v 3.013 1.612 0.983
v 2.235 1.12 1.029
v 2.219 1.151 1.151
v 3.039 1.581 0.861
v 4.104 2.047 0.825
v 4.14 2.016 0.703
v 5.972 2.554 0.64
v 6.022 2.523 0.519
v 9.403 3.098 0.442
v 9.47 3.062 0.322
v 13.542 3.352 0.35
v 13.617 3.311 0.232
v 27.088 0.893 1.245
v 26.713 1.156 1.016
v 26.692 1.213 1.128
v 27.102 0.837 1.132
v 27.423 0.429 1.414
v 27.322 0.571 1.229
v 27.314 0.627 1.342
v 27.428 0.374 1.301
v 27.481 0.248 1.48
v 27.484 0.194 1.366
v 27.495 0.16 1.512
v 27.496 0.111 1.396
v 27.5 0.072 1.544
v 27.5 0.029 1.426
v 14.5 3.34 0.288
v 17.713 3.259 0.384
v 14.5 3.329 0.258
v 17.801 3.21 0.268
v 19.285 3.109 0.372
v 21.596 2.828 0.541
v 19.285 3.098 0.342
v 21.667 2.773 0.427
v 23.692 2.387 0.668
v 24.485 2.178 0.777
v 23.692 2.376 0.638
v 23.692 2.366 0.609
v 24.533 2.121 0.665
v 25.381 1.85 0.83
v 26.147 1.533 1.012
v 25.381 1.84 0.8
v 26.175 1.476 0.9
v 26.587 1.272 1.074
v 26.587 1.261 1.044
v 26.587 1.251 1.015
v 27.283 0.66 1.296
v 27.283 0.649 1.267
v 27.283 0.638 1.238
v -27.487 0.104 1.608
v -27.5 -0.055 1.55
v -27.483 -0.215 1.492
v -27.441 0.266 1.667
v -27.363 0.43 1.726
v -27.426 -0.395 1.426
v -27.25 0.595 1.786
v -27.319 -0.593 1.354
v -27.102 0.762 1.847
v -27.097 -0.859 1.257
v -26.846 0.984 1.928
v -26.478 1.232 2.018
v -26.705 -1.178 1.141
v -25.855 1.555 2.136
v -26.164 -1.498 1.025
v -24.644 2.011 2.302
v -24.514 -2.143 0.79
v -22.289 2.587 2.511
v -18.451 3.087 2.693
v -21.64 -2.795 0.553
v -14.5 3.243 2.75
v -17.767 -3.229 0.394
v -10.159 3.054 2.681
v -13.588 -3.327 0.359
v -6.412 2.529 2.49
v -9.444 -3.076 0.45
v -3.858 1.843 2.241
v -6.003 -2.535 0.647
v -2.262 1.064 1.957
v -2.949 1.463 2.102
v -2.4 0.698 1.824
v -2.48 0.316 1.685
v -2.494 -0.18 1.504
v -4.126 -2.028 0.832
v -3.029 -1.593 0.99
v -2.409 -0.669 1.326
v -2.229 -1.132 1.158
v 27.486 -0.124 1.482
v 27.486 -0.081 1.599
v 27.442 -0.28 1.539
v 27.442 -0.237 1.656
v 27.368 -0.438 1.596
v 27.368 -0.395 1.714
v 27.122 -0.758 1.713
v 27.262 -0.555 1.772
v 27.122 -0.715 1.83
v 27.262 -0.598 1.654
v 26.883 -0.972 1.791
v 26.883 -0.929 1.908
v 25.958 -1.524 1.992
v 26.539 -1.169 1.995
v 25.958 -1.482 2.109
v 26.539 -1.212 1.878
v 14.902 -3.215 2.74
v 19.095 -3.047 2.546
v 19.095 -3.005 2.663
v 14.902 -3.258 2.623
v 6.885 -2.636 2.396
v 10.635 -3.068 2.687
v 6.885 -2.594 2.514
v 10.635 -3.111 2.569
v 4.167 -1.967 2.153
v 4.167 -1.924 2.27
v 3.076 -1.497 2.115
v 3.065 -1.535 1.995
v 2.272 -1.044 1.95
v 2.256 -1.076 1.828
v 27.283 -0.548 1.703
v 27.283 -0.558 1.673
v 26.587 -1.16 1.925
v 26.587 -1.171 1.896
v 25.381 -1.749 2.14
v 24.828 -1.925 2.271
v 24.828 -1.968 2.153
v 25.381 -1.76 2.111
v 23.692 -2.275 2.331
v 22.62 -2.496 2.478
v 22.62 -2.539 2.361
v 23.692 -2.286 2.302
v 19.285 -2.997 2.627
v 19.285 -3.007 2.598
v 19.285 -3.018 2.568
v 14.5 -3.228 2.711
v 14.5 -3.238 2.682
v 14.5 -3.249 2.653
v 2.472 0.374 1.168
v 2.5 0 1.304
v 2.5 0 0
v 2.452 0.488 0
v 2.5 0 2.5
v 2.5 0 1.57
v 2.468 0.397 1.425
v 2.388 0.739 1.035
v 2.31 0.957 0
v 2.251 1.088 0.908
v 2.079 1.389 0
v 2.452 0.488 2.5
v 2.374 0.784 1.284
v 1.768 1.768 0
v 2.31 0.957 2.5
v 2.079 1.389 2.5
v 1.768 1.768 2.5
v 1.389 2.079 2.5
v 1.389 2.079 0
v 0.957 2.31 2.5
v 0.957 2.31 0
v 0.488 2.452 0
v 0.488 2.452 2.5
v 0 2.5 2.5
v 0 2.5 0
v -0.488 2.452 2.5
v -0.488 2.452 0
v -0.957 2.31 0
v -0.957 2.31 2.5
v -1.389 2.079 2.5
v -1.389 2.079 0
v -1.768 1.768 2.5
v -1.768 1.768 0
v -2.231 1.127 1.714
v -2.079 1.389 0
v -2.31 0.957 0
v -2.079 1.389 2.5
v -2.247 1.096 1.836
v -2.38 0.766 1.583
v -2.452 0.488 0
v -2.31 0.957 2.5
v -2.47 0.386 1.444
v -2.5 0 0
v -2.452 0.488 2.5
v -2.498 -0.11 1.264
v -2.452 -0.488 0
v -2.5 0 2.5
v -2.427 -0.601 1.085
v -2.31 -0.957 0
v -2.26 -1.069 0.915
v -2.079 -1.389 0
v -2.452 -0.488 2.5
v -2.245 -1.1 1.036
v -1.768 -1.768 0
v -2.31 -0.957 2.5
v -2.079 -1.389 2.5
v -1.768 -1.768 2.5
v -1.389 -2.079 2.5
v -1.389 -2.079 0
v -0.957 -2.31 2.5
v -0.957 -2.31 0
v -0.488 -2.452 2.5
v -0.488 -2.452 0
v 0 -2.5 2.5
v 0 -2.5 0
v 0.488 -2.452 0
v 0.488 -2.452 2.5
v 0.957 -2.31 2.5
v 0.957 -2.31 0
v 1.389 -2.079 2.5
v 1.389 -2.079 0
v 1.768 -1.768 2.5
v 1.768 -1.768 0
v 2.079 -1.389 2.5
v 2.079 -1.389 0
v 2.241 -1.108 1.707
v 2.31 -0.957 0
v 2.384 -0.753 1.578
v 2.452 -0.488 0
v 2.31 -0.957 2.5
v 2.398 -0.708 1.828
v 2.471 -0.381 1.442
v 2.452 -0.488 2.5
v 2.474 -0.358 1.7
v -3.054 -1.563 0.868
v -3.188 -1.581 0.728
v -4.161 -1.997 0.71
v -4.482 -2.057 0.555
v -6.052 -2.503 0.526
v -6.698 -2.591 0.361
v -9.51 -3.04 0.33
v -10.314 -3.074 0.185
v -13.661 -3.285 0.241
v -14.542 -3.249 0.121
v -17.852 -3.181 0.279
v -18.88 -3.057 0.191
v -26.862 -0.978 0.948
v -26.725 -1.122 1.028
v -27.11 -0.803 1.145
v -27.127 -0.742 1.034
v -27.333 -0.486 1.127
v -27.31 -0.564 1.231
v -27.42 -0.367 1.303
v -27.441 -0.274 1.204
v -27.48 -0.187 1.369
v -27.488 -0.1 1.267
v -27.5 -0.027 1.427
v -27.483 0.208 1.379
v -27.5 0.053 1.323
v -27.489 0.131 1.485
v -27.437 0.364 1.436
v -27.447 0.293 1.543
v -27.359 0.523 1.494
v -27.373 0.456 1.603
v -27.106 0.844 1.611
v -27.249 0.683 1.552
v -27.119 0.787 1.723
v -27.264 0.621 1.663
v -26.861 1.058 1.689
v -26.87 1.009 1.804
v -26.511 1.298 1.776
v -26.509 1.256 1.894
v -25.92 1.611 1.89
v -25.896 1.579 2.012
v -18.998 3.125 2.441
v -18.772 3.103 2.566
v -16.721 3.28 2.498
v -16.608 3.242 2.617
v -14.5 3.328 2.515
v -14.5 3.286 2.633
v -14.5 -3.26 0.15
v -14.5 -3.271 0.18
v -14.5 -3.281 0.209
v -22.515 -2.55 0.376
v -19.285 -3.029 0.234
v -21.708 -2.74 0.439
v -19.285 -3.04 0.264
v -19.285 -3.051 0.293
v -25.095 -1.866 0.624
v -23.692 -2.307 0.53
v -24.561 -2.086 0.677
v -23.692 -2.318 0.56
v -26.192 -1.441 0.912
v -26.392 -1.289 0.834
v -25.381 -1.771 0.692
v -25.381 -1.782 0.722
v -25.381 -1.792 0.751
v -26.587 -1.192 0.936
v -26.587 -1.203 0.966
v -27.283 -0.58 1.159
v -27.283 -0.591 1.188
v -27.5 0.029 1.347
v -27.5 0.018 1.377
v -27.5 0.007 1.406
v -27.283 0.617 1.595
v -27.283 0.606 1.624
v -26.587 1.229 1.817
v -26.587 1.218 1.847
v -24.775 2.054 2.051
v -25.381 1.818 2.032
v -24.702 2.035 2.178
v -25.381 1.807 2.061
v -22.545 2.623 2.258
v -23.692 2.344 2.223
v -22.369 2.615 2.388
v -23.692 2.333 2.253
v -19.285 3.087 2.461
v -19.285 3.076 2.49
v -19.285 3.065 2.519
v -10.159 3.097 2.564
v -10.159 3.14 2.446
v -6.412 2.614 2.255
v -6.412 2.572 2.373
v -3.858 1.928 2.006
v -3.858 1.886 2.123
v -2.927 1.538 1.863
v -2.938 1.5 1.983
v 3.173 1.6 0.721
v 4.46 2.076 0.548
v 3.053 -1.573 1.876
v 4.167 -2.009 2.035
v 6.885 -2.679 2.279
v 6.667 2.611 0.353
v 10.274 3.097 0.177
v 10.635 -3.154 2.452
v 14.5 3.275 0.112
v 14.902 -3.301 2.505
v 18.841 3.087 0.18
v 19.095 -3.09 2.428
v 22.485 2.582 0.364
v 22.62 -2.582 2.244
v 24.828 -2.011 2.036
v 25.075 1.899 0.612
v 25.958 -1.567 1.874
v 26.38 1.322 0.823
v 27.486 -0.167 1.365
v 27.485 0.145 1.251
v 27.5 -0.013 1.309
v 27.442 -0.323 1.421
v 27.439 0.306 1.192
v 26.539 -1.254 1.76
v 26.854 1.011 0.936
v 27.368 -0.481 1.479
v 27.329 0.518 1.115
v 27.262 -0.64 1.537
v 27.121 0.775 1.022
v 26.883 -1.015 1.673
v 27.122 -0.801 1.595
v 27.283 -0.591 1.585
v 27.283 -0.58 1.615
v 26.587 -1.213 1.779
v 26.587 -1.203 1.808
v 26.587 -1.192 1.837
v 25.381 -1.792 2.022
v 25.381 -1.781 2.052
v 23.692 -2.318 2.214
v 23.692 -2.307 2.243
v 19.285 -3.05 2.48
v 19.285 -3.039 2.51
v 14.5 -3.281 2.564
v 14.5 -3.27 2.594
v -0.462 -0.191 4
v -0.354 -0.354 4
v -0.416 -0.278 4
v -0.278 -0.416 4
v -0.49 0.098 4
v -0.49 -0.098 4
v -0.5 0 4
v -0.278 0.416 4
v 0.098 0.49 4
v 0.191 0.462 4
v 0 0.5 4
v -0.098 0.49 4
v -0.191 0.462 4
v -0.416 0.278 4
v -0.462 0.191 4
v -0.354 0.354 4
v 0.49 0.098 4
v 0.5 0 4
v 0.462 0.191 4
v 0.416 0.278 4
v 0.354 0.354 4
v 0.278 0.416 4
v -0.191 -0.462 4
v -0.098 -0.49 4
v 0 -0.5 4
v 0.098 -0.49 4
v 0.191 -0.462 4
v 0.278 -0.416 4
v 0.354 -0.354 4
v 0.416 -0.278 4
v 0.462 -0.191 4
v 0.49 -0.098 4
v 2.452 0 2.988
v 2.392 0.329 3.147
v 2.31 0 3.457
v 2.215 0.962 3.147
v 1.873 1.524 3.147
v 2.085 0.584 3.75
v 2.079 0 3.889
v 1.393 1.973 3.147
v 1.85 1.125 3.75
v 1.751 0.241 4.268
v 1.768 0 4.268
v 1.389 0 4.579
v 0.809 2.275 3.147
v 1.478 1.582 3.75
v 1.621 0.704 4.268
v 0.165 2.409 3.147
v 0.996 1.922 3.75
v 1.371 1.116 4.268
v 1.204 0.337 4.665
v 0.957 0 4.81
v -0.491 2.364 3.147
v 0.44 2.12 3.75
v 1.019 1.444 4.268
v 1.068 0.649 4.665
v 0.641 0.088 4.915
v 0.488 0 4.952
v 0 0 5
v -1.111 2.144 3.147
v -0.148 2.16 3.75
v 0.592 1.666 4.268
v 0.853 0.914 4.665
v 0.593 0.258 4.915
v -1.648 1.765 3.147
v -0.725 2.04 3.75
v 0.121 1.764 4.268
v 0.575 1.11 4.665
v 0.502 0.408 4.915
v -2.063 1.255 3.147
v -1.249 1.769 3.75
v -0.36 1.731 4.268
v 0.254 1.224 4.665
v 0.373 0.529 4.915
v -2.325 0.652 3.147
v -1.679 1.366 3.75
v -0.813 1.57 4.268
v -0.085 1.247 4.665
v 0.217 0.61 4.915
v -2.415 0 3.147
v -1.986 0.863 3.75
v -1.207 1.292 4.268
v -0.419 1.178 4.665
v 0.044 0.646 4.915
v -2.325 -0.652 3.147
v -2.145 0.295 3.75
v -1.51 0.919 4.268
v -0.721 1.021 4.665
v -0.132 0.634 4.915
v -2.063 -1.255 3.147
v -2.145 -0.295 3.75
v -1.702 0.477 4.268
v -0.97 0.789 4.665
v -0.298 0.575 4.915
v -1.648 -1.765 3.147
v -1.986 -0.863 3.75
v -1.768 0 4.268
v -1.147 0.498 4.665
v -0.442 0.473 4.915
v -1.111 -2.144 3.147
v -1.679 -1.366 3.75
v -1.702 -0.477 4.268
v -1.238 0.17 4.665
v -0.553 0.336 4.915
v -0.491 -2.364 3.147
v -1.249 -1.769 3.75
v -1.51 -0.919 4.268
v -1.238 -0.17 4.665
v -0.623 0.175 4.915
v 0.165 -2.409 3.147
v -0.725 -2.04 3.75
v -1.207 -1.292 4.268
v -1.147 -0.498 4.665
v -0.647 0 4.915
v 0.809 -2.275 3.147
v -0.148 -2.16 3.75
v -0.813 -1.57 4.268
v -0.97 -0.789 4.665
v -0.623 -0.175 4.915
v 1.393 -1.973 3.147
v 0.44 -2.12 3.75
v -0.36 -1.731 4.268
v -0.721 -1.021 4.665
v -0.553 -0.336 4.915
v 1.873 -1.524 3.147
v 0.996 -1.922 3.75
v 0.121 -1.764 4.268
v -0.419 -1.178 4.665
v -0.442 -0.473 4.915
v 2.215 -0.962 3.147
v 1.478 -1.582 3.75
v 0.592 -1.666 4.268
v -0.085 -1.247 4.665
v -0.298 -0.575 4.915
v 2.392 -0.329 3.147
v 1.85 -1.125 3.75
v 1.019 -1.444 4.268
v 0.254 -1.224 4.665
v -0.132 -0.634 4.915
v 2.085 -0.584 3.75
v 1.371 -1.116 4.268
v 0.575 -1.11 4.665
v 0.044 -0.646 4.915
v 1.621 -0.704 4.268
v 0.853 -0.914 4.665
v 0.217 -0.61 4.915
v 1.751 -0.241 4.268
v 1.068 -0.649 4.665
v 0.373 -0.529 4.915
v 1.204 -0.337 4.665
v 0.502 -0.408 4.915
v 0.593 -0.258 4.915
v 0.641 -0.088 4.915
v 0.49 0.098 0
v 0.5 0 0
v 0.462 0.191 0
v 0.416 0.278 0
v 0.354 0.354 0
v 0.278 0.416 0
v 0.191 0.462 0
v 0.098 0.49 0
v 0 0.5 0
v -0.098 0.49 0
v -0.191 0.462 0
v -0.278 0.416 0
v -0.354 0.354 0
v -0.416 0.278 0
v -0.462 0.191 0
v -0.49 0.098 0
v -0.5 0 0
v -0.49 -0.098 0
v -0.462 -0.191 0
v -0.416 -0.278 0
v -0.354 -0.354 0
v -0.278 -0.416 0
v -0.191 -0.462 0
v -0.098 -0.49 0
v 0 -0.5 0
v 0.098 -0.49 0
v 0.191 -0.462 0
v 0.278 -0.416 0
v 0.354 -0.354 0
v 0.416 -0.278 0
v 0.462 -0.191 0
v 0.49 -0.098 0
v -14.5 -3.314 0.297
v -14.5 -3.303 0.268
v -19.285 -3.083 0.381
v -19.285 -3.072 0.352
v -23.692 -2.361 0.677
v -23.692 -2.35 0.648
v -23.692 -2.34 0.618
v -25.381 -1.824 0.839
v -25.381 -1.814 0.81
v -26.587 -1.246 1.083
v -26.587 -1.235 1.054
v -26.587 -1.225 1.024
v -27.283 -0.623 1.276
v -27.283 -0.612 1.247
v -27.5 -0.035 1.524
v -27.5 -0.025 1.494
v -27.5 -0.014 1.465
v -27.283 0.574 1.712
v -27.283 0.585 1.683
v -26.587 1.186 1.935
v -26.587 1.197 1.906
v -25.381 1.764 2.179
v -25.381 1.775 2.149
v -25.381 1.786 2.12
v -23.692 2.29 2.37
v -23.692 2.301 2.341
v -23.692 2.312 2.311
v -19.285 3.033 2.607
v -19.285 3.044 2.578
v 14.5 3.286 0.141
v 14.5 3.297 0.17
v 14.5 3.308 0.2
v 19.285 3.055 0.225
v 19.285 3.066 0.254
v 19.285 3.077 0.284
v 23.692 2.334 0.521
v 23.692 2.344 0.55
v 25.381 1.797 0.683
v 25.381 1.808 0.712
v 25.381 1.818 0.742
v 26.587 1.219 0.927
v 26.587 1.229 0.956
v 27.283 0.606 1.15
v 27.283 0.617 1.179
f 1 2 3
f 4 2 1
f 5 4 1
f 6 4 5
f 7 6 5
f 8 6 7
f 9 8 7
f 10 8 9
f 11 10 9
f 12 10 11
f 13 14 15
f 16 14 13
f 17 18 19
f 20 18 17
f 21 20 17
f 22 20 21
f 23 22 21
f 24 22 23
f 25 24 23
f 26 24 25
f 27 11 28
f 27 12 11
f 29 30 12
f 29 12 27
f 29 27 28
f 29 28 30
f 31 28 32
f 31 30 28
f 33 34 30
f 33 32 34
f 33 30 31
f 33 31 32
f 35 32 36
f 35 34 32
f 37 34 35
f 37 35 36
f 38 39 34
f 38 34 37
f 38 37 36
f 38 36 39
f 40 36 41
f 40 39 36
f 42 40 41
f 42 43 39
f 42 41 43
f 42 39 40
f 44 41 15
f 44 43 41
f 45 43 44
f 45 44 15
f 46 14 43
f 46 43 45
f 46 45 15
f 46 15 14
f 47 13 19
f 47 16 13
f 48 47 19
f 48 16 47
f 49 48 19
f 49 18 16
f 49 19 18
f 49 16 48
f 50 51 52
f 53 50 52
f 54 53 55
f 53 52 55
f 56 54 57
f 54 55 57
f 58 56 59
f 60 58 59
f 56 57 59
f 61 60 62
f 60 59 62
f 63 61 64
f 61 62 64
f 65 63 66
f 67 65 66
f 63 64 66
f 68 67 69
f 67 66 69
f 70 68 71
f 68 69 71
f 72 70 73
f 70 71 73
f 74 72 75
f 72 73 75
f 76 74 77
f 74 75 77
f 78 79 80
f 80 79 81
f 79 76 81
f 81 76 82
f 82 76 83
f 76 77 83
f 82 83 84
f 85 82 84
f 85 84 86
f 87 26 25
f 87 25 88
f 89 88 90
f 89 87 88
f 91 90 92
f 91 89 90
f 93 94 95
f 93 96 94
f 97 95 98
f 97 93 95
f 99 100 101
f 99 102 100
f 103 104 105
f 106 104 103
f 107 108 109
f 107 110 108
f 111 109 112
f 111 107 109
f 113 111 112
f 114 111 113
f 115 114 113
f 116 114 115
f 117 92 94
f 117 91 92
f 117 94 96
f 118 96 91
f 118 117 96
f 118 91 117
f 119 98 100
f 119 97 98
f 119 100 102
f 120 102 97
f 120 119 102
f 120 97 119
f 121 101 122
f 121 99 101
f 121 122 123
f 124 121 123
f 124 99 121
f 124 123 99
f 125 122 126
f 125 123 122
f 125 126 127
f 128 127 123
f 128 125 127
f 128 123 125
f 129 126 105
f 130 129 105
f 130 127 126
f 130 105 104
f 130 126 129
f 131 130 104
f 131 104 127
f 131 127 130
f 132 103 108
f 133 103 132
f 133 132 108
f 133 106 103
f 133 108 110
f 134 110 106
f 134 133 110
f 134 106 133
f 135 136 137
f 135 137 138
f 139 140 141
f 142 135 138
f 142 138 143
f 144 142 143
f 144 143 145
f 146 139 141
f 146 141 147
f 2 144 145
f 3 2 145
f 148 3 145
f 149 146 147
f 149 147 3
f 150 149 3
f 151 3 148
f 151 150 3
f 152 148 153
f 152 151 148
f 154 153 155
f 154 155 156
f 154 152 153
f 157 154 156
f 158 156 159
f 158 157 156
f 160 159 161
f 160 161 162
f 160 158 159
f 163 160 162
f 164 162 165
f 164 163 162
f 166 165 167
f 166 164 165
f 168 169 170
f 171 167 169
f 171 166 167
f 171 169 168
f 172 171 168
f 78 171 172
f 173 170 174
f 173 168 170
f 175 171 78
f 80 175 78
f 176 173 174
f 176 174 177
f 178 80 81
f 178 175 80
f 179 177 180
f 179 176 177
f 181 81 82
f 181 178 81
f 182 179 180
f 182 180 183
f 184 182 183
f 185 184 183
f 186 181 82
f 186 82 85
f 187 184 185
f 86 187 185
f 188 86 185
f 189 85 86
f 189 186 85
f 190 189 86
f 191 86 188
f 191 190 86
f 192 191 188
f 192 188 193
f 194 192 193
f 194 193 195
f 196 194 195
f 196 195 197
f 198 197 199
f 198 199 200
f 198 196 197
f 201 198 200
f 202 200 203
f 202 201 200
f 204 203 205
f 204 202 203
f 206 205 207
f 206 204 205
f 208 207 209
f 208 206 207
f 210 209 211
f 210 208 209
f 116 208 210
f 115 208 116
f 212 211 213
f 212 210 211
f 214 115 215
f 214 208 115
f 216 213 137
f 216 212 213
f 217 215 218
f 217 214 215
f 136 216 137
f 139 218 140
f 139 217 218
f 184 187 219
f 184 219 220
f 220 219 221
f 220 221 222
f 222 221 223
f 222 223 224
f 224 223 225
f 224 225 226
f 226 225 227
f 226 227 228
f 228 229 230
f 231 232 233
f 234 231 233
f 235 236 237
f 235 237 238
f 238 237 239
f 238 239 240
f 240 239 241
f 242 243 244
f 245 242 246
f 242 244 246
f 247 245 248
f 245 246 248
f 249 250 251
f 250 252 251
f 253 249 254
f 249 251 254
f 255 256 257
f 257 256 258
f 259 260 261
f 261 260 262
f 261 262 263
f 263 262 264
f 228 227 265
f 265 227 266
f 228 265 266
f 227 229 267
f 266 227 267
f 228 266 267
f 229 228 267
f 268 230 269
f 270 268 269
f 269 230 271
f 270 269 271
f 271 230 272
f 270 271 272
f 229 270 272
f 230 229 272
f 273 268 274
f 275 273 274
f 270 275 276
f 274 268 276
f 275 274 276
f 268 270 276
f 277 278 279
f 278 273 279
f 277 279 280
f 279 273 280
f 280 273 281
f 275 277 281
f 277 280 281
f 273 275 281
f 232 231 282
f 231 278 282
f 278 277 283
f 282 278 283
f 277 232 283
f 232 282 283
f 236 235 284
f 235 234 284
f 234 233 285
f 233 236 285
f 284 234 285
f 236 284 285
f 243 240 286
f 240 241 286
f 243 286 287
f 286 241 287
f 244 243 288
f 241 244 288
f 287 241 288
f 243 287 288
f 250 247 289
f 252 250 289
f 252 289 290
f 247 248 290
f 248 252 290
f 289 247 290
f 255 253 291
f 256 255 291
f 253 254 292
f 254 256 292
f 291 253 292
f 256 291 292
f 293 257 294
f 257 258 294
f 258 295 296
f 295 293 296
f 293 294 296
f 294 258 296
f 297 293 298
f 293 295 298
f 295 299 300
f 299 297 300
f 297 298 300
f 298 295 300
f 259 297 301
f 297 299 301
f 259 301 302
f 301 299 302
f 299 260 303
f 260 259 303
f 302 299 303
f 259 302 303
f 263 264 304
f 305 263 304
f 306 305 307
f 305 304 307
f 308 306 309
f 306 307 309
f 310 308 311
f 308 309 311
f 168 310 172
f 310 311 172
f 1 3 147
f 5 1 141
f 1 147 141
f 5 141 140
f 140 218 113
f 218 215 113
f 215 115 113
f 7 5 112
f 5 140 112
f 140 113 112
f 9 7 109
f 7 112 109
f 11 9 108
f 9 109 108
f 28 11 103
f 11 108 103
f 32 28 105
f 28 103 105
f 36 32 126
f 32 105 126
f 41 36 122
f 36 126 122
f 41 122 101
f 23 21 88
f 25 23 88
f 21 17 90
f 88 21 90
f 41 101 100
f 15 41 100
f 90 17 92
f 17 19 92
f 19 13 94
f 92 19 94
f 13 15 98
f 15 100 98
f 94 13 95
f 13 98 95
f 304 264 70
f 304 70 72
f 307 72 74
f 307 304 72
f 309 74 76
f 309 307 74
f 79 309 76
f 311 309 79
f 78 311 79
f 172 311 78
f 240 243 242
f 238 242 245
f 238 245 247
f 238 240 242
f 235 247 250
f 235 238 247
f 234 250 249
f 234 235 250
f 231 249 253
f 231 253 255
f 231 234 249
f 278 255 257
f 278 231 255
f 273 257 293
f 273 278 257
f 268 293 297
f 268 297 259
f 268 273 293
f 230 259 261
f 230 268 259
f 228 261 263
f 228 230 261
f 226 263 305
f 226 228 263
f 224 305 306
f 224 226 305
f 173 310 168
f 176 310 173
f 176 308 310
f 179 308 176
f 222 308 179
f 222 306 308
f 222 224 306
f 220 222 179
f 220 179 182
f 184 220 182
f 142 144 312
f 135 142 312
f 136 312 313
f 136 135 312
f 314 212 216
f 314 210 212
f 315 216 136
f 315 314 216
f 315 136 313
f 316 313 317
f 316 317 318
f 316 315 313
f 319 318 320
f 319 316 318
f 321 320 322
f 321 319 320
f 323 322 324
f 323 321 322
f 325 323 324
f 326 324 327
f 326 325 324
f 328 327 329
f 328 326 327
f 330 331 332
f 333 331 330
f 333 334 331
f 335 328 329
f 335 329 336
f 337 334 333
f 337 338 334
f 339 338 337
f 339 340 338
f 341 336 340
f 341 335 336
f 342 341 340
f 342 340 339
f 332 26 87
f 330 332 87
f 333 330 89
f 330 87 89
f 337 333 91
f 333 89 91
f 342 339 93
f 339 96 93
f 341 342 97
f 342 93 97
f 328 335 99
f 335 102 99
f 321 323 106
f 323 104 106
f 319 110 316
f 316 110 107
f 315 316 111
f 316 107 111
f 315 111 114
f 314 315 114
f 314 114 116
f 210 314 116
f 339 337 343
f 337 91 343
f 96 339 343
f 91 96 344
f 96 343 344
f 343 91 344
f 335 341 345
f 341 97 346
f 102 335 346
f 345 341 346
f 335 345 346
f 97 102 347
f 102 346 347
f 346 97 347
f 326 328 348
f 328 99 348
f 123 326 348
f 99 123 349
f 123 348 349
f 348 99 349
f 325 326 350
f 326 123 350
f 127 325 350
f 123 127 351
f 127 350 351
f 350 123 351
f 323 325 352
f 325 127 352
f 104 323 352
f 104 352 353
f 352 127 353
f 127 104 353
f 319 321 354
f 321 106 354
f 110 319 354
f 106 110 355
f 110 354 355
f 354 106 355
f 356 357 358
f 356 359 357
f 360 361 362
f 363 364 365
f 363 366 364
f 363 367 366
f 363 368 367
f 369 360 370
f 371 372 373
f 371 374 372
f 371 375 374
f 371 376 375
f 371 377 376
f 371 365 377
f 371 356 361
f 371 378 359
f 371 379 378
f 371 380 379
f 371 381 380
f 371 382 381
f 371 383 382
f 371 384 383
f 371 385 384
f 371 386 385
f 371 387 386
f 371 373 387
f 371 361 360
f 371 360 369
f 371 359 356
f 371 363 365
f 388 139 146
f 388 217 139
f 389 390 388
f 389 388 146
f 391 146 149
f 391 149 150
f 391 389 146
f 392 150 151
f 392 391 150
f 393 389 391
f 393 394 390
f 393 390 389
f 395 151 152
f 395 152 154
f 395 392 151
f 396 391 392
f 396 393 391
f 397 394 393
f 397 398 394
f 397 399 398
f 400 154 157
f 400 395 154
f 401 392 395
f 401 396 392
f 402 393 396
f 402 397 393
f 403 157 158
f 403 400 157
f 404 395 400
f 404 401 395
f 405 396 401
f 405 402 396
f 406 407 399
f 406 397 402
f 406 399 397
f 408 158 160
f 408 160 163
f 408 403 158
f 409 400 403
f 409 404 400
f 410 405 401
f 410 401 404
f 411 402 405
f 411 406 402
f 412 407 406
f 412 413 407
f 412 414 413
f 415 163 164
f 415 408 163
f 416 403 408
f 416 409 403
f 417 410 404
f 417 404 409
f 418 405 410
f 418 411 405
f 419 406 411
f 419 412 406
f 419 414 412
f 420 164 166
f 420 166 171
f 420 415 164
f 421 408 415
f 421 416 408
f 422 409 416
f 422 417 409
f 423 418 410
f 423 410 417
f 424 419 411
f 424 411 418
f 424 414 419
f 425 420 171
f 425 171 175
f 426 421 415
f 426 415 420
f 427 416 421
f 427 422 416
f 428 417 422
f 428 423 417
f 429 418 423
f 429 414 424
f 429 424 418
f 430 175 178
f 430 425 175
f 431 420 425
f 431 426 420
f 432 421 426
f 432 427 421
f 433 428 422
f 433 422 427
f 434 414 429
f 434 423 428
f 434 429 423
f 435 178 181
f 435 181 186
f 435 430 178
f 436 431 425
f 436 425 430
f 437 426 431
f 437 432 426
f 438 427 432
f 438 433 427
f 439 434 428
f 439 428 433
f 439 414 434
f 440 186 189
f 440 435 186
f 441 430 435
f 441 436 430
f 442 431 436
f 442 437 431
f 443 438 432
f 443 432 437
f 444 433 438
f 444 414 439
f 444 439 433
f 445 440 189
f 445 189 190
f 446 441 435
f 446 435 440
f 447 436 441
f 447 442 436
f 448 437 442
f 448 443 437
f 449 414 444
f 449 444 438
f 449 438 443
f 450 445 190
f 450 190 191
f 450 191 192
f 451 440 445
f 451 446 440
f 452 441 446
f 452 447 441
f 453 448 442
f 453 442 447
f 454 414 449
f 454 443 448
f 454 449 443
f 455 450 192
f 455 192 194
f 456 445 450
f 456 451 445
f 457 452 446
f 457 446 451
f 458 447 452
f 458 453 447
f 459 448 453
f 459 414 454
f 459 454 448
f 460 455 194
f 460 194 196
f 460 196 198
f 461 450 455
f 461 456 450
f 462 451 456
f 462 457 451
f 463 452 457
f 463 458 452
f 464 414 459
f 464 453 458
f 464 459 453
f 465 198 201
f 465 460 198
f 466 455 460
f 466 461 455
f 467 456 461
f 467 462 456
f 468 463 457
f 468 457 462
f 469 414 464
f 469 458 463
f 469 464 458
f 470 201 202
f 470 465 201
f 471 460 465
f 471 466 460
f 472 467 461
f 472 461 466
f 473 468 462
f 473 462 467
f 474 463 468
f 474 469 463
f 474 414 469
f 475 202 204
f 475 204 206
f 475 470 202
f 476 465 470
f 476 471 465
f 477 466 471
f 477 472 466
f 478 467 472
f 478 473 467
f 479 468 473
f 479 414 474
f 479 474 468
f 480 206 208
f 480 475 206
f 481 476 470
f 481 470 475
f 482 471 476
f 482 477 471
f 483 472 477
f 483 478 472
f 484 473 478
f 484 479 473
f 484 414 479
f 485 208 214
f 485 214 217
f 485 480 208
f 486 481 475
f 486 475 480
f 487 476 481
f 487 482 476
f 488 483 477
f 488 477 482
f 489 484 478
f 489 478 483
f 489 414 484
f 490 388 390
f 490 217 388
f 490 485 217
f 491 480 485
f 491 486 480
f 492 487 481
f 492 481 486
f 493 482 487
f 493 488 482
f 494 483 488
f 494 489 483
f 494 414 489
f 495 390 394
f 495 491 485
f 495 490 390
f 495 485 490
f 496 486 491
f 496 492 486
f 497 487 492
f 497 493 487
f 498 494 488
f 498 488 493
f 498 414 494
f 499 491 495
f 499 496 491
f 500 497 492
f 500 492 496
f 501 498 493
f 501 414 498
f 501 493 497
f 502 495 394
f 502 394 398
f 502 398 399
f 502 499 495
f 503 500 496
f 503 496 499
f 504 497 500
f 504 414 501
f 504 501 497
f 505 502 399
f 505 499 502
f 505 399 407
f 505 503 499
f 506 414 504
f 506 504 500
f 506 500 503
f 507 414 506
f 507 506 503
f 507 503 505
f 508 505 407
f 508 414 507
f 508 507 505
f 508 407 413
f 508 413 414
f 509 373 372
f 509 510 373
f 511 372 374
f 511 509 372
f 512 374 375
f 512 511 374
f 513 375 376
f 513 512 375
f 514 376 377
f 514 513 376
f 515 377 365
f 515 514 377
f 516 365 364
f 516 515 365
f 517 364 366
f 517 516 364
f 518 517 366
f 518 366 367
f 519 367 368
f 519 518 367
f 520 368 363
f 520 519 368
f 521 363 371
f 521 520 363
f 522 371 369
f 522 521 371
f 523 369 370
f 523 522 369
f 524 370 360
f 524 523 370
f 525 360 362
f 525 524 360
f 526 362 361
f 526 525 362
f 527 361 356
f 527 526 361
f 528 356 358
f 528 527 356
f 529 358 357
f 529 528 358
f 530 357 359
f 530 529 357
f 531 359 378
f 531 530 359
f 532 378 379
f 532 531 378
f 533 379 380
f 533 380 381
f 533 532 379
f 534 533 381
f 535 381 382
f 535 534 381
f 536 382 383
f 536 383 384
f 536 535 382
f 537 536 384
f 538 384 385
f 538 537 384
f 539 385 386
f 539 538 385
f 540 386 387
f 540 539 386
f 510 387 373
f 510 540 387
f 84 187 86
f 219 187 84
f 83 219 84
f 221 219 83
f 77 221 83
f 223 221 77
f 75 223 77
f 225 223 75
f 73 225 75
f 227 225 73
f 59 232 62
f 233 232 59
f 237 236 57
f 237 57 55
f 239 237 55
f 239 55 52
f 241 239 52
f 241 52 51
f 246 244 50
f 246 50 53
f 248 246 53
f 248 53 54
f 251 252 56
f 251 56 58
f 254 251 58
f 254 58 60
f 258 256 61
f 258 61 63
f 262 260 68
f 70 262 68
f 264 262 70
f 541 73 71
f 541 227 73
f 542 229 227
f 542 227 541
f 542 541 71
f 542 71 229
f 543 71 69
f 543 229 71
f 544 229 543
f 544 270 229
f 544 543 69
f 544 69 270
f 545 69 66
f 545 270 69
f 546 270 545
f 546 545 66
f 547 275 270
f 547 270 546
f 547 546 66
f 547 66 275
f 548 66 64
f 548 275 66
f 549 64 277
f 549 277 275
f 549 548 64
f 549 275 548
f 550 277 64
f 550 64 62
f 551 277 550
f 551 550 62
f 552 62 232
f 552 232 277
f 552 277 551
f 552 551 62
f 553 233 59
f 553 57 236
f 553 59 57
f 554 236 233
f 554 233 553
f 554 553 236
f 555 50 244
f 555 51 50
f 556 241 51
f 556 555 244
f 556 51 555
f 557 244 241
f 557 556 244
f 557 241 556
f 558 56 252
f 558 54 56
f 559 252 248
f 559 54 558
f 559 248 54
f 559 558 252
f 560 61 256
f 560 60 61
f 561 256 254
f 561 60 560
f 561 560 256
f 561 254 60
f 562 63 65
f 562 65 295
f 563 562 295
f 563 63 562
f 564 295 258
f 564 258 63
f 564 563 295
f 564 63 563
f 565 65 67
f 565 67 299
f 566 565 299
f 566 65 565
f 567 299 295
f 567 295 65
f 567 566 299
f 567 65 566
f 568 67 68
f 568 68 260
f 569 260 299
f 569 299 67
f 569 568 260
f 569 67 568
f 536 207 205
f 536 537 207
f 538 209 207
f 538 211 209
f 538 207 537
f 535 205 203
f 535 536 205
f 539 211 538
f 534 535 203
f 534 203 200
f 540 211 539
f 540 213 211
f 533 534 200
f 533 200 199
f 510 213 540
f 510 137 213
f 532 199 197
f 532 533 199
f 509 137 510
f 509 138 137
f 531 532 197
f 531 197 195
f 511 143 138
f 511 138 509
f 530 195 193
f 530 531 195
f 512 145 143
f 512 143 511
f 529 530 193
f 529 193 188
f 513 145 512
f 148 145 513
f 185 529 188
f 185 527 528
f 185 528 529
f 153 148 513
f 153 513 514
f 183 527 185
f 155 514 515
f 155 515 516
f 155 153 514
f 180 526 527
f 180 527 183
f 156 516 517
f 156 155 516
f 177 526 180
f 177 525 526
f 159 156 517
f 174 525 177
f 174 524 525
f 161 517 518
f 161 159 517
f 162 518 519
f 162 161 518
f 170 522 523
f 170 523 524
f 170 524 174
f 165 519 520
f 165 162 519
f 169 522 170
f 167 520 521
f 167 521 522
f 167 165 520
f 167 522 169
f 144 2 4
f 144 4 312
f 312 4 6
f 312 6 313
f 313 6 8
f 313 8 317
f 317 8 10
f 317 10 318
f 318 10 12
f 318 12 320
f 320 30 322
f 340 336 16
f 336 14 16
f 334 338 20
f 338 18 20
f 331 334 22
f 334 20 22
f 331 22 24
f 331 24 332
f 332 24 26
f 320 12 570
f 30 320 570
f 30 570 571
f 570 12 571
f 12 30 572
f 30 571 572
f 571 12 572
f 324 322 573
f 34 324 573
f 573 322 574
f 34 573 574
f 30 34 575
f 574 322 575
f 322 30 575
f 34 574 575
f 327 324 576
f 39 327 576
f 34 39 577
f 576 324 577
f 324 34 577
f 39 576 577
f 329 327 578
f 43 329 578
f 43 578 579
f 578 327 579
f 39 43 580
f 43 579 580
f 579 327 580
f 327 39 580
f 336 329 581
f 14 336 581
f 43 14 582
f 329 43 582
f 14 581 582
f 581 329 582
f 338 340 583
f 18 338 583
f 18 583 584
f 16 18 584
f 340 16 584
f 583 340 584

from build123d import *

# Parameters (mm, degrees)
F6_DEPTH = 0.125
F8_DEPTH = 0.125


with BuildPart() as f1:
    # F0 (on Front) → F1 (revolve)
    with BuildSketch(Plane.XZ):
        with BuildLine():
            Line((0, 5), (0, 4))
            Line((0, 4), (0.5, 4))
            Line((0.5, 4), (0.5, 0))
            Line((0.5, 0), (2.5, 0))
            Line((2.5, 0), (2.5, 2.5))
            ThreePointArc((2.5, 2.5), (1.767766953, 4.267766953), (0, 5))
        make_face()
    revolve(axis=Axis((0, 0, 2.5), (0, 0, 1)))

    # F5 (on face) → F6 (join, symmetric)
    with BuildSketch(Plane(origin=(0, -0.461767139, 1.2686947874), x_dir=(1, 0, 0), z_dir=(0, 0.3420201433, -0.9396926208))):
        with BuildLine():
            Line((-14.5, -3.9879612534), (-14.5, -0.4879612534))
            Line((-14.5, -0.4879612534), (-27.5, -0.4879612534))
            add(Edge.make_bspline(
                [(-27.5, -0.4879612534), (-27.5, -3.9879612534), (-14.5, -3.9879612534)],
                knots=[0, 0, 0, 1.5707963268, 1.5707963268, 1.5707963268], degree=2, weights=[1, 0.7071067812, 1]))
        make_face()
        with BuildLine():
            Line((-27.5, -0.4879612534), (-14.5, -0.4879612534))
            Line((-14.5, -0.4879612534), (-1.5, -0.4879612534))
            add(Edge.make_bspline(
                [(-1.5, -0.4879612534), (-1.5, 3.0120387466), (-14.5, 3.0120387466), (-27.5, 3.0120387466), (-27.5, -0.4879612534)],
                knots=[3.1415926536, 3.1415926536, 3.1415926536, 4.7123889804, 4.7123889804, 6.2831853072, 6.2831853072, 6.2831853072], degree=2, weights=[1, 0.7071067812, 1, 0.7071067812, 1]))
        make_face()
        with BuildLine():
            Line((-1.5, -0.4879612534), (-14.5, -0.4879612534))
            Line((-14.5, -0.4879612534), (-14.5, -3.9879612534))
            add(Edge.make_bspline(
                [(-14.5, -3.9879612534), (-1.5, -3.9879612534), (-1.5, -0.4879612534)],
                knots=[1.5707963268, 1.5707963268, 1.5707963268, 3.1415926536, 3.1415926536, 3.1415926536], degree=2, weights=[1, 0.7071067812, 1]))
        make_face()
    extrude(amount=F6_DEPTH, both=True)

    # F7 (on face) → F8 (join, symmetric)
    with BuildSketch(Plane(origin=(0, 0.461767139, 1.2686947874), x_dir=(1, 0, 0), z_dir=(0, -0.3420201433, -0.9396926208))):
        with BuildLine():
            Line((27.5, 0.4602281842), (14.5, 0.4602281842))
            Line((14.5, 0.4602281842), (1.5, 0.4602281842))
            add(Edge.make_bspline(
                [(1.5, 0.4602281842), (1.5, -3.0397718158), (14.5, -3.0397718158), (27.5, -3.0397718158), (27.5, 0.4602281842)],
                knots=[3.1415926536, 3.1415926536, 3.1415926536, 4.7123889804, 4.7123889804, 6.2831853072, 6.2831853072, 6.2831853072], degree=2, weights=[1, 0.7071067812, 1, 0.7071067812, 1]))
        make_face()
        with BuildLine():
            Line((1.5, 0.4602281842), (14.5, 0.4602281842))
            Line((14.5, 0.4602281842), (14.5, 3.9602281842))
            add(Edge.make_bspline(
                [(14.5, 3.9602281842), (1.5, 3.9602281842), (1.5, 0.4602281842)],
                knots=[1.5707963268, 1.5707963268, 1.5707963268, 3.1415926536, 3.1415926536, 3.1415926536], degree=2, weights=[1, 0.7071067812, 1]))
        make_face()
        with BuildLine():
            Line((14.5, 3.9602281842), (14.5, 0.4602281842))
            Line((14.5, 0.4602281842), (27.5, 0.4602281842))
            add(Edge.make_bspline(
                [(27.5, 0.4602281842), (27.5, 3.9602281842), (14.5, 3.9602281842)],
                knots=[0, 0, 0, 1.5707963268, 1.5707963268, 1.5707963268], degree=2, weights=[1, 0.7071067812, 1]))
        make_face()
    extrude(amount=F8_DEPTH, both=True)


solid = f1.part
